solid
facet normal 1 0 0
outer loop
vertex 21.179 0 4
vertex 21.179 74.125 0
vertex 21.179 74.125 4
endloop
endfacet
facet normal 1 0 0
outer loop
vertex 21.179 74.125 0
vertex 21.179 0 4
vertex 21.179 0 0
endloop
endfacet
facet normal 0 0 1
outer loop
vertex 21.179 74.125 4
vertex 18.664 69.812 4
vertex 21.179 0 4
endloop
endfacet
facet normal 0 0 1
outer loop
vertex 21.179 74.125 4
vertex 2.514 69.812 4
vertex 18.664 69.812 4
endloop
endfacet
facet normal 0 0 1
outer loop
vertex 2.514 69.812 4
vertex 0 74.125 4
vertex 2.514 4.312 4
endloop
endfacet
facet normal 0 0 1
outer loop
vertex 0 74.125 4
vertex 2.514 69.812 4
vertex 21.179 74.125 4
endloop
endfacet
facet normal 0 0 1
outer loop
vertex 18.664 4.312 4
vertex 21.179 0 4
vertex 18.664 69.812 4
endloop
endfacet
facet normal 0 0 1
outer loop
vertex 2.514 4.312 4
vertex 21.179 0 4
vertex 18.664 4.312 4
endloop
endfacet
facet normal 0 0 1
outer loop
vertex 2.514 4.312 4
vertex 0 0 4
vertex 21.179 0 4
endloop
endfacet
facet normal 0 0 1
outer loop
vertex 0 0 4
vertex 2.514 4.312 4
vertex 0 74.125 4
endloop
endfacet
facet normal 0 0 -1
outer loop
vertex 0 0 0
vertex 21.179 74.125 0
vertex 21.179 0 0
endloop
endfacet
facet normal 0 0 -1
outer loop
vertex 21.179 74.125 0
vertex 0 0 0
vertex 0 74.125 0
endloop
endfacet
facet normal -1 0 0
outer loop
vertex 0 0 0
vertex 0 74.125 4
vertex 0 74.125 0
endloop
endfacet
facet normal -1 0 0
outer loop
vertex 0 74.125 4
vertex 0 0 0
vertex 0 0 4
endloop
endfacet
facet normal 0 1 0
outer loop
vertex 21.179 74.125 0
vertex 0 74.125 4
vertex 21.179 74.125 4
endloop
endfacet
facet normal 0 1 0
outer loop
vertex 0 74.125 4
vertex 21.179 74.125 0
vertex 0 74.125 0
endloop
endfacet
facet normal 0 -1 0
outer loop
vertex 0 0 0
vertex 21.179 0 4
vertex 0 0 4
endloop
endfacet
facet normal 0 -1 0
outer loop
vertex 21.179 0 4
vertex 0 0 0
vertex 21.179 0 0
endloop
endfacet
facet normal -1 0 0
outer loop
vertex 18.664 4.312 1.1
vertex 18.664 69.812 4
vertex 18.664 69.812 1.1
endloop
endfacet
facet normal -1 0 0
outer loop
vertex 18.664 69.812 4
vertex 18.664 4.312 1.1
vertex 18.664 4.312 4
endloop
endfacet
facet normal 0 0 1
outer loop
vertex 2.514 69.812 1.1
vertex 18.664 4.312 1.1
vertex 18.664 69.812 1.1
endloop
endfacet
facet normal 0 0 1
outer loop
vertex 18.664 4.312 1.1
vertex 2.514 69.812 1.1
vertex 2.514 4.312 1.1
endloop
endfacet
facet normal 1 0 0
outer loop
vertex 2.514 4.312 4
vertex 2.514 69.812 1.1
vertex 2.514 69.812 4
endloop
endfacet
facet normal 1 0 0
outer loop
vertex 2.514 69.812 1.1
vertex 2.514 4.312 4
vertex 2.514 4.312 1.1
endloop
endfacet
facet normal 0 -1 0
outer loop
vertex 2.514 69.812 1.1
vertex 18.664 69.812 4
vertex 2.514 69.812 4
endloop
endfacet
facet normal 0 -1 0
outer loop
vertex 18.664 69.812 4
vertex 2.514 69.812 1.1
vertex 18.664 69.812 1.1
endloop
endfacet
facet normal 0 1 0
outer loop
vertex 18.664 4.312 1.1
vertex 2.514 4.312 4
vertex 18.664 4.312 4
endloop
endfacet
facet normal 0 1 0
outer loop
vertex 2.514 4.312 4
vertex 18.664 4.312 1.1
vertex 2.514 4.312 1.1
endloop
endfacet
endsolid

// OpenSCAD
item_width = 16.15;
item_length = 65.5;
item_depth = 2.9;

jig_width = 21.1785714286;
jig_length = 74.125;
jig_depth = 4;

mold_area_width = jig_width / 1;
mold_area_length = jig_length / 1;

difference() {
    // Jig
    cube([
        jig_width,
        jig_length,
        jig_depth
    ]);

    // Items
    translate([
        1/2 * (mold_area_width - item_width),
        1/2 * (mold_area_length - item_length),
        jig_depth - item_depth
    ]) {
        cube([
            item_width,
            item_length,
            item_depth
        ]);
    }
}
